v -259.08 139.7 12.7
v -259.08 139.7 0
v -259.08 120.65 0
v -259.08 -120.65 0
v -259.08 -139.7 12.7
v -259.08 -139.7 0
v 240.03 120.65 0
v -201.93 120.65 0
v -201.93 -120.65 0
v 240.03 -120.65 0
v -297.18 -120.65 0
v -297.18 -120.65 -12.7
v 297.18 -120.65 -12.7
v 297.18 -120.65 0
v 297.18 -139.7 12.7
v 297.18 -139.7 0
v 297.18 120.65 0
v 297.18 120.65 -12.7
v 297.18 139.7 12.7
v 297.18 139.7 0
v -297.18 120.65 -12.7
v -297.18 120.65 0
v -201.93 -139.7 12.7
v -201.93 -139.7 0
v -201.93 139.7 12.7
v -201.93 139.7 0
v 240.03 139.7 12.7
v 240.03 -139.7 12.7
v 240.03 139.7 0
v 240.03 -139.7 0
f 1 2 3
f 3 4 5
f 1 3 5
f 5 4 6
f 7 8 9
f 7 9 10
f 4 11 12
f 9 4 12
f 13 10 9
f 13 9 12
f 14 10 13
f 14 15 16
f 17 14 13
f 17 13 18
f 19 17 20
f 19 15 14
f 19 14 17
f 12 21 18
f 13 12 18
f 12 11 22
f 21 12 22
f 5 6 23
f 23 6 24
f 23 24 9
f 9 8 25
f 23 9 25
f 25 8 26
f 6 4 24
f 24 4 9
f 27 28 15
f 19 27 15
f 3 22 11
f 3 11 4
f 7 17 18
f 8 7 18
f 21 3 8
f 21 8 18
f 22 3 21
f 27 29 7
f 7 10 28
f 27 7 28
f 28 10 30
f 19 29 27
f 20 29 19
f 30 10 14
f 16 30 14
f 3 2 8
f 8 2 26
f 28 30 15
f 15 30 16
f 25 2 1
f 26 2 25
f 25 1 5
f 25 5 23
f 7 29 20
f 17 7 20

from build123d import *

# Parameters (mm, degrees)
F0_W     = 38.1
F0_H     = 241.3
F0_W_2   = 57.15
F0_W_3   = 441.96
F1_DEPTH = 12.7
F0_H_2   = 19.05
F2_DEPTH = 12.7


# Not quite as in the source:
# - a feature names something its author has since deleted; it is built from what else it names


with BuildPart() as f1:
    # F0 (on Top) → F1 (new body)
    with BuildSketch(Plane.XY):
        with Locations((-278.13, 0)):
            Rectangle(F0_W, F0_H)
        with Locations((-230.505, 0)):
            Rectangle(F0_W_2, F0_H)
        with Locations((19.05, 0)):
            Rectangle(F0_W_3, F0_H)
        with Locations((268.605, 0)):
            Rectangle(F0_W_2, F0_H)
    extrude(amount=-F1_DEPTH)

    # F0 (on Top) → F2 (join)
    with BuildSketch(Plane.XY):
        with Locations((-230.505, 130.175)):
            Rectangle(F0_W_2, F0_H_2)
        with Locations((-230.505, -130.175)):
            Rectangle(F0_W_2, F0_H_2)
        with Locations((-230.505, 0)):
            Rectangle(F0_W_2, F0_H)
        with Locations((268.605, 0)):
            Rectangle(F0_W_2, F0_H)
        with Locations((268.605, -130.175)):
            Rectangle(F0_W_2, F0_H_2)
        with Locations((268.605, 130.175)):
            Rectangle(F0_W_2, F0_H_2)
    extrude(amount=F2_DEPTH)


solid = f1.part
